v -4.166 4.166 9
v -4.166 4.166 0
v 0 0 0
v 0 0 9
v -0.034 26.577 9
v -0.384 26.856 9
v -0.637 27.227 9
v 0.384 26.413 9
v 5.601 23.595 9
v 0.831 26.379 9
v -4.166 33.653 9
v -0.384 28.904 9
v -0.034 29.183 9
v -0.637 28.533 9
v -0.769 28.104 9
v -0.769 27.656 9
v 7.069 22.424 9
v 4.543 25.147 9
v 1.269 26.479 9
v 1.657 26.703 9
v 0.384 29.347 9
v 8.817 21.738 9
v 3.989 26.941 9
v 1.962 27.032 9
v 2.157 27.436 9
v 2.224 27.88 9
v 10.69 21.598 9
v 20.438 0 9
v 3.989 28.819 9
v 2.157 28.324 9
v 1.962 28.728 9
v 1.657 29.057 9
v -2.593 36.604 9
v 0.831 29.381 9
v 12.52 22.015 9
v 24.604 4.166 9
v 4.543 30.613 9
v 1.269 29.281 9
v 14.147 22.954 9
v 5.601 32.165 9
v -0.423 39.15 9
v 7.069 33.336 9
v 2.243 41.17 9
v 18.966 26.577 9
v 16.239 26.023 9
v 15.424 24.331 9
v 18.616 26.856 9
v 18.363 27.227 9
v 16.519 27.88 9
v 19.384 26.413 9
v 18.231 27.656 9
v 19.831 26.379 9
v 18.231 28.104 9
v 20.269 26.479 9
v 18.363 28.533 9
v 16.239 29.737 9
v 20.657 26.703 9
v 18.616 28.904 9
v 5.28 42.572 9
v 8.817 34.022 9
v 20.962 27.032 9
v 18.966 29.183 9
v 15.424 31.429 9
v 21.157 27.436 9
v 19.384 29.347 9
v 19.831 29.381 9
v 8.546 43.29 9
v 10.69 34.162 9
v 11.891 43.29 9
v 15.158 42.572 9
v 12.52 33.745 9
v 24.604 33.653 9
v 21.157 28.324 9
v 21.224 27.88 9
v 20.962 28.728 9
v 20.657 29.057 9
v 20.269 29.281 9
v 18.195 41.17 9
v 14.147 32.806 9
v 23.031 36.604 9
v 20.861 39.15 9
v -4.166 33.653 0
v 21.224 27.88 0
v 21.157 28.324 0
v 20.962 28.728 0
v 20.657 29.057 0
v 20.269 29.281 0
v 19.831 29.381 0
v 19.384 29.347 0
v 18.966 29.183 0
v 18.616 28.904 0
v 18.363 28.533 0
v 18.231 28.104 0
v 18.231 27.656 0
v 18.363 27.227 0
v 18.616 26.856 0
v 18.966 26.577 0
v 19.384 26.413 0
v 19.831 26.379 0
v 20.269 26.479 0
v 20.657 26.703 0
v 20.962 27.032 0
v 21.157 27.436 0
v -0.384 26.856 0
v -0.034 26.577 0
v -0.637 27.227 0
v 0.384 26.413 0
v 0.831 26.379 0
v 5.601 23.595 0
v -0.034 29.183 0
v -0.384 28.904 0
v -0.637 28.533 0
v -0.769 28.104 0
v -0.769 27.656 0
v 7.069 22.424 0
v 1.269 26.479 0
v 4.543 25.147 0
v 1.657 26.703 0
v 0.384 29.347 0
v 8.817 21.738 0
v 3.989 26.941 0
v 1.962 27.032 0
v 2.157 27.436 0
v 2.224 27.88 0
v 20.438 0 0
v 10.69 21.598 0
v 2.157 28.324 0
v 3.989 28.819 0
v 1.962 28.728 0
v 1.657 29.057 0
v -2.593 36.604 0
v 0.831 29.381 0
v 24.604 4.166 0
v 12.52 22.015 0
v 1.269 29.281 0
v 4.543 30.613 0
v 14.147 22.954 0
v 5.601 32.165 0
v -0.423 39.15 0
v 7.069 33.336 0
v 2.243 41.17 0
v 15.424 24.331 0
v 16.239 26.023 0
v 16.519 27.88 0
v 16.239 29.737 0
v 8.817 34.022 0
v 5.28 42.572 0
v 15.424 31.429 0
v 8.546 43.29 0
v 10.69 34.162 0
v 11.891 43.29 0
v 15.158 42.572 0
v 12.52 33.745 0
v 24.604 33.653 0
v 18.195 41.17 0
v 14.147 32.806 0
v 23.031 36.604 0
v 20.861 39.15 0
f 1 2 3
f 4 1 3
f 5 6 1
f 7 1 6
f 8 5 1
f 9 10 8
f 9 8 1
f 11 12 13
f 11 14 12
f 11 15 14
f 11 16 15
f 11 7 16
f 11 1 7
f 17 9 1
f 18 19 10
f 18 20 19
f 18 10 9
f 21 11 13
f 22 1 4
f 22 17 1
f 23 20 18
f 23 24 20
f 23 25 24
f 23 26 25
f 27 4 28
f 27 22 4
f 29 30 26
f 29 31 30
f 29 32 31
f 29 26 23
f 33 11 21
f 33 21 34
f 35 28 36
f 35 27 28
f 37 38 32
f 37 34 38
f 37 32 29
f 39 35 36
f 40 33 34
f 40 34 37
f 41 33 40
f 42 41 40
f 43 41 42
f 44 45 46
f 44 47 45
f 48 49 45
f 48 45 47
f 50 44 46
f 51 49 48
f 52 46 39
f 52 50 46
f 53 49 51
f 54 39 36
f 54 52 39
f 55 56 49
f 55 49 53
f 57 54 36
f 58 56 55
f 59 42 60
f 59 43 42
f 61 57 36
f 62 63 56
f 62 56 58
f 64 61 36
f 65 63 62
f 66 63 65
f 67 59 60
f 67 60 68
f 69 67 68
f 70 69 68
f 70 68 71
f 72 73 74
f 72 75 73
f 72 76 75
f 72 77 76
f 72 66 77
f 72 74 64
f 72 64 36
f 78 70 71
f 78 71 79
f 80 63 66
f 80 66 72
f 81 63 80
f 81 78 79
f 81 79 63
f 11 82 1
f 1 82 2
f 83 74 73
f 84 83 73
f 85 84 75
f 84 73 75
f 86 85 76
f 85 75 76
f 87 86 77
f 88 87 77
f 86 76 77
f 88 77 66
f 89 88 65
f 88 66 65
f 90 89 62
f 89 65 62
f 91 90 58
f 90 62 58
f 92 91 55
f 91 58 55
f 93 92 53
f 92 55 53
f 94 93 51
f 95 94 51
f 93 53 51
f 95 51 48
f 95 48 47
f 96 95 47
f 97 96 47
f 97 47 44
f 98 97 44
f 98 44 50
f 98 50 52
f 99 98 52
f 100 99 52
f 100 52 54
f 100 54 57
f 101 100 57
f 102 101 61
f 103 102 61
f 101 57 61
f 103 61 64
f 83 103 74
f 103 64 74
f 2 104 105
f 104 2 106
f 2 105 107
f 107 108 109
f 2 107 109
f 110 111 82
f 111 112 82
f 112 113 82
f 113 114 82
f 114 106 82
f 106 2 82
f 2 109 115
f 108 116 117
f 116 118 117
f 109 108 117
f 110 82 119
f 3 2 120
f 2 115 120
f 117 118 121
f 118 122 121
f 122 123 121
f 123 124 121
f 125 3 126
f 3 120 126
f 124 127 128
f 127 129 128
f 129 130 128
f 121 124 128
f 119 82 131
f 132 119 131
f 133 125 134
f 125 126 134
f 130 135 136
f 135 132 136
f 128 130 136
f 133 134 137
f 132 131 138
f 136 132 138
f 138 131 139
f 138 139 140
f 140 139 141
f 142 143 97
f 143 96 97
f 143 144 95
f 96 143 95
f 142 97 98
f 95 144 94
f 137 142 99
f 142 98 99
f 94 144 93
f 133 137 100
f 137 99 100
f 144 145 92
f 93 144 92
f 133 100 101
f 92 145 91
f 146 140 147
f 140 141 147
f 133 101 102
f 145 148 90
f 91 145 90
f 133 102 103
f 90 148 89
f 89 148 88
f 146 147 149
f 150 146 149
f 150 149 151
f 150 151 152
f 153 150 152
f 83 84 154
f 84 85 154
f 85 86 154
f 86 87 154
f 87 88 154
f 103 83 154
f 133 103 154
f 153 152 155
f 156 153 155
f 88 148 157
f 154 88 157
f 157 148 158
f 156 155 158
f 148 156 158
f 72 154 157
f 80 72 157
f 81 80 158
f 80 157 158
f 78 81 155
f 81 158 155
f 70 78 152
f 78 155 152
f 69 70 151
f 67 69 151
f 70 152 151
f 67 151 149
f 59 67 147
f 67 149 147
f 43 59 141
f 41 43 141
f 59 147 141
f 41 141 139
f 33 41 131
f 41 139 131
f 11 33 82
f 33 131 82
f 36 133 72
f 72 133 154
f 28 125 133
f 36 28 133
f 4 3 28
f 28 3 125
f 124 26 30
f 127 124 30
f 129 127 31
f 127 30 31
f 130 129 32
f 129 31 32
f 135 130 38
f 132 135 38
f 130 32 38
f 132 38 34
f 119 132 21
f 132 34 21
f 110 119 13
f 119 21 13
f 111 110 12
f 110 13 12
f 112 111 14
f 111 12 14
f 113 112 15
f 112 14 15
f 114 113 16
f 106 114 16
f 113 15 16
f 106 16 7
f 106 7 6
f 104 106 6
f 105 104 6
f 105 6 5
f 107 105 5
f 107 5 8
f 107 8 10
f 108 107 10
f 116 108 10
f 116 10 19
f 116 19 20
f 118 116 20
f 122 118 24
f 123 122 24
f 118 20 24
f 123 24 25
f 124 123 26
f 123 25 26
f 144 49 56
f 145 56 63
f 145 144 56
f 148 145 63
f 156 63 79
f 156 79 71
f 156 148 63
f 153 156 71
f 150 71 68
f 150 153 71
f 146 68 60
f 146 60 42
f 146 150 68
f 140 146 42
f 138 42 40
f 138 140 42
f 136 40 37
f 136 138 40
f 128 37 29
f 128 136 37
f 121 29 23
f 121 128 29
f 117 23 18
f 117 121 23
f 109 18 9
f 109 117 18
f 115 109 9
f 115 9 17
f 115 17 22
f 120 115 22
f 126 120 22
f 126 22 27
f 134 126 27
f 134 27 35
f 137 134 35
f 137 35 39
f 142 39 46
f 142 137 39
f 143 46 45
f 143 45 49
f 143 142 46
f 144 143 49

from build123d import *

# Parameters (mm, degrees)
SKETCH1_R           = 6.3
BOSS_EXTRUDE1_DEPTH = 9
SKETCH2_R           = 1.505
CUT_EXTRUDE1_DEPTH  = 9


with BuildPart() as part:
    # Sketch1 → Boss-Extrude1 (new body)
    with BuildSketch(Plane.XY):
        with BuildLine():
            Line((0, 0), (20.437665022, 0))
            Line((20.437665022, 0), (24.603832511, 4.166167489))
            Line((24.603832511, 4.166167489), (24.603832511, 33.652501624))
            ThreePointArc((24.603832511, 33.652501624), (10.218832511, 43.38), (-4.166167489, 33.652501624))
            Line((-4.166167489, 33.652501624), (-4.166167489, 4.166167489))
            Line((-4.166167489, 4.166167489), (0, 0))
        make_face()
        with Locations((10.218832511, 27.88)):
            Circle(SKETCH1_R, mode=Mode.SUBTRACT)
    extrude(amount=BOSS_EXTRUDE1_DEPTH)

    # Sketch2 → Cut-Extrude1 (cut)
    with BuildSketch(Plane.XY.offset(9)):
        with Locations((0.718832511, 27.88)):
            Circle(SKETCH2_R)
        with Locations((19.718832511, 27.88)):
            Circle(SKETCH2_R)
    extrude(amount=-CUT_EXTRUDE1_DEPTH, mode=Mode.SUBTRACT)


solid = part.part
